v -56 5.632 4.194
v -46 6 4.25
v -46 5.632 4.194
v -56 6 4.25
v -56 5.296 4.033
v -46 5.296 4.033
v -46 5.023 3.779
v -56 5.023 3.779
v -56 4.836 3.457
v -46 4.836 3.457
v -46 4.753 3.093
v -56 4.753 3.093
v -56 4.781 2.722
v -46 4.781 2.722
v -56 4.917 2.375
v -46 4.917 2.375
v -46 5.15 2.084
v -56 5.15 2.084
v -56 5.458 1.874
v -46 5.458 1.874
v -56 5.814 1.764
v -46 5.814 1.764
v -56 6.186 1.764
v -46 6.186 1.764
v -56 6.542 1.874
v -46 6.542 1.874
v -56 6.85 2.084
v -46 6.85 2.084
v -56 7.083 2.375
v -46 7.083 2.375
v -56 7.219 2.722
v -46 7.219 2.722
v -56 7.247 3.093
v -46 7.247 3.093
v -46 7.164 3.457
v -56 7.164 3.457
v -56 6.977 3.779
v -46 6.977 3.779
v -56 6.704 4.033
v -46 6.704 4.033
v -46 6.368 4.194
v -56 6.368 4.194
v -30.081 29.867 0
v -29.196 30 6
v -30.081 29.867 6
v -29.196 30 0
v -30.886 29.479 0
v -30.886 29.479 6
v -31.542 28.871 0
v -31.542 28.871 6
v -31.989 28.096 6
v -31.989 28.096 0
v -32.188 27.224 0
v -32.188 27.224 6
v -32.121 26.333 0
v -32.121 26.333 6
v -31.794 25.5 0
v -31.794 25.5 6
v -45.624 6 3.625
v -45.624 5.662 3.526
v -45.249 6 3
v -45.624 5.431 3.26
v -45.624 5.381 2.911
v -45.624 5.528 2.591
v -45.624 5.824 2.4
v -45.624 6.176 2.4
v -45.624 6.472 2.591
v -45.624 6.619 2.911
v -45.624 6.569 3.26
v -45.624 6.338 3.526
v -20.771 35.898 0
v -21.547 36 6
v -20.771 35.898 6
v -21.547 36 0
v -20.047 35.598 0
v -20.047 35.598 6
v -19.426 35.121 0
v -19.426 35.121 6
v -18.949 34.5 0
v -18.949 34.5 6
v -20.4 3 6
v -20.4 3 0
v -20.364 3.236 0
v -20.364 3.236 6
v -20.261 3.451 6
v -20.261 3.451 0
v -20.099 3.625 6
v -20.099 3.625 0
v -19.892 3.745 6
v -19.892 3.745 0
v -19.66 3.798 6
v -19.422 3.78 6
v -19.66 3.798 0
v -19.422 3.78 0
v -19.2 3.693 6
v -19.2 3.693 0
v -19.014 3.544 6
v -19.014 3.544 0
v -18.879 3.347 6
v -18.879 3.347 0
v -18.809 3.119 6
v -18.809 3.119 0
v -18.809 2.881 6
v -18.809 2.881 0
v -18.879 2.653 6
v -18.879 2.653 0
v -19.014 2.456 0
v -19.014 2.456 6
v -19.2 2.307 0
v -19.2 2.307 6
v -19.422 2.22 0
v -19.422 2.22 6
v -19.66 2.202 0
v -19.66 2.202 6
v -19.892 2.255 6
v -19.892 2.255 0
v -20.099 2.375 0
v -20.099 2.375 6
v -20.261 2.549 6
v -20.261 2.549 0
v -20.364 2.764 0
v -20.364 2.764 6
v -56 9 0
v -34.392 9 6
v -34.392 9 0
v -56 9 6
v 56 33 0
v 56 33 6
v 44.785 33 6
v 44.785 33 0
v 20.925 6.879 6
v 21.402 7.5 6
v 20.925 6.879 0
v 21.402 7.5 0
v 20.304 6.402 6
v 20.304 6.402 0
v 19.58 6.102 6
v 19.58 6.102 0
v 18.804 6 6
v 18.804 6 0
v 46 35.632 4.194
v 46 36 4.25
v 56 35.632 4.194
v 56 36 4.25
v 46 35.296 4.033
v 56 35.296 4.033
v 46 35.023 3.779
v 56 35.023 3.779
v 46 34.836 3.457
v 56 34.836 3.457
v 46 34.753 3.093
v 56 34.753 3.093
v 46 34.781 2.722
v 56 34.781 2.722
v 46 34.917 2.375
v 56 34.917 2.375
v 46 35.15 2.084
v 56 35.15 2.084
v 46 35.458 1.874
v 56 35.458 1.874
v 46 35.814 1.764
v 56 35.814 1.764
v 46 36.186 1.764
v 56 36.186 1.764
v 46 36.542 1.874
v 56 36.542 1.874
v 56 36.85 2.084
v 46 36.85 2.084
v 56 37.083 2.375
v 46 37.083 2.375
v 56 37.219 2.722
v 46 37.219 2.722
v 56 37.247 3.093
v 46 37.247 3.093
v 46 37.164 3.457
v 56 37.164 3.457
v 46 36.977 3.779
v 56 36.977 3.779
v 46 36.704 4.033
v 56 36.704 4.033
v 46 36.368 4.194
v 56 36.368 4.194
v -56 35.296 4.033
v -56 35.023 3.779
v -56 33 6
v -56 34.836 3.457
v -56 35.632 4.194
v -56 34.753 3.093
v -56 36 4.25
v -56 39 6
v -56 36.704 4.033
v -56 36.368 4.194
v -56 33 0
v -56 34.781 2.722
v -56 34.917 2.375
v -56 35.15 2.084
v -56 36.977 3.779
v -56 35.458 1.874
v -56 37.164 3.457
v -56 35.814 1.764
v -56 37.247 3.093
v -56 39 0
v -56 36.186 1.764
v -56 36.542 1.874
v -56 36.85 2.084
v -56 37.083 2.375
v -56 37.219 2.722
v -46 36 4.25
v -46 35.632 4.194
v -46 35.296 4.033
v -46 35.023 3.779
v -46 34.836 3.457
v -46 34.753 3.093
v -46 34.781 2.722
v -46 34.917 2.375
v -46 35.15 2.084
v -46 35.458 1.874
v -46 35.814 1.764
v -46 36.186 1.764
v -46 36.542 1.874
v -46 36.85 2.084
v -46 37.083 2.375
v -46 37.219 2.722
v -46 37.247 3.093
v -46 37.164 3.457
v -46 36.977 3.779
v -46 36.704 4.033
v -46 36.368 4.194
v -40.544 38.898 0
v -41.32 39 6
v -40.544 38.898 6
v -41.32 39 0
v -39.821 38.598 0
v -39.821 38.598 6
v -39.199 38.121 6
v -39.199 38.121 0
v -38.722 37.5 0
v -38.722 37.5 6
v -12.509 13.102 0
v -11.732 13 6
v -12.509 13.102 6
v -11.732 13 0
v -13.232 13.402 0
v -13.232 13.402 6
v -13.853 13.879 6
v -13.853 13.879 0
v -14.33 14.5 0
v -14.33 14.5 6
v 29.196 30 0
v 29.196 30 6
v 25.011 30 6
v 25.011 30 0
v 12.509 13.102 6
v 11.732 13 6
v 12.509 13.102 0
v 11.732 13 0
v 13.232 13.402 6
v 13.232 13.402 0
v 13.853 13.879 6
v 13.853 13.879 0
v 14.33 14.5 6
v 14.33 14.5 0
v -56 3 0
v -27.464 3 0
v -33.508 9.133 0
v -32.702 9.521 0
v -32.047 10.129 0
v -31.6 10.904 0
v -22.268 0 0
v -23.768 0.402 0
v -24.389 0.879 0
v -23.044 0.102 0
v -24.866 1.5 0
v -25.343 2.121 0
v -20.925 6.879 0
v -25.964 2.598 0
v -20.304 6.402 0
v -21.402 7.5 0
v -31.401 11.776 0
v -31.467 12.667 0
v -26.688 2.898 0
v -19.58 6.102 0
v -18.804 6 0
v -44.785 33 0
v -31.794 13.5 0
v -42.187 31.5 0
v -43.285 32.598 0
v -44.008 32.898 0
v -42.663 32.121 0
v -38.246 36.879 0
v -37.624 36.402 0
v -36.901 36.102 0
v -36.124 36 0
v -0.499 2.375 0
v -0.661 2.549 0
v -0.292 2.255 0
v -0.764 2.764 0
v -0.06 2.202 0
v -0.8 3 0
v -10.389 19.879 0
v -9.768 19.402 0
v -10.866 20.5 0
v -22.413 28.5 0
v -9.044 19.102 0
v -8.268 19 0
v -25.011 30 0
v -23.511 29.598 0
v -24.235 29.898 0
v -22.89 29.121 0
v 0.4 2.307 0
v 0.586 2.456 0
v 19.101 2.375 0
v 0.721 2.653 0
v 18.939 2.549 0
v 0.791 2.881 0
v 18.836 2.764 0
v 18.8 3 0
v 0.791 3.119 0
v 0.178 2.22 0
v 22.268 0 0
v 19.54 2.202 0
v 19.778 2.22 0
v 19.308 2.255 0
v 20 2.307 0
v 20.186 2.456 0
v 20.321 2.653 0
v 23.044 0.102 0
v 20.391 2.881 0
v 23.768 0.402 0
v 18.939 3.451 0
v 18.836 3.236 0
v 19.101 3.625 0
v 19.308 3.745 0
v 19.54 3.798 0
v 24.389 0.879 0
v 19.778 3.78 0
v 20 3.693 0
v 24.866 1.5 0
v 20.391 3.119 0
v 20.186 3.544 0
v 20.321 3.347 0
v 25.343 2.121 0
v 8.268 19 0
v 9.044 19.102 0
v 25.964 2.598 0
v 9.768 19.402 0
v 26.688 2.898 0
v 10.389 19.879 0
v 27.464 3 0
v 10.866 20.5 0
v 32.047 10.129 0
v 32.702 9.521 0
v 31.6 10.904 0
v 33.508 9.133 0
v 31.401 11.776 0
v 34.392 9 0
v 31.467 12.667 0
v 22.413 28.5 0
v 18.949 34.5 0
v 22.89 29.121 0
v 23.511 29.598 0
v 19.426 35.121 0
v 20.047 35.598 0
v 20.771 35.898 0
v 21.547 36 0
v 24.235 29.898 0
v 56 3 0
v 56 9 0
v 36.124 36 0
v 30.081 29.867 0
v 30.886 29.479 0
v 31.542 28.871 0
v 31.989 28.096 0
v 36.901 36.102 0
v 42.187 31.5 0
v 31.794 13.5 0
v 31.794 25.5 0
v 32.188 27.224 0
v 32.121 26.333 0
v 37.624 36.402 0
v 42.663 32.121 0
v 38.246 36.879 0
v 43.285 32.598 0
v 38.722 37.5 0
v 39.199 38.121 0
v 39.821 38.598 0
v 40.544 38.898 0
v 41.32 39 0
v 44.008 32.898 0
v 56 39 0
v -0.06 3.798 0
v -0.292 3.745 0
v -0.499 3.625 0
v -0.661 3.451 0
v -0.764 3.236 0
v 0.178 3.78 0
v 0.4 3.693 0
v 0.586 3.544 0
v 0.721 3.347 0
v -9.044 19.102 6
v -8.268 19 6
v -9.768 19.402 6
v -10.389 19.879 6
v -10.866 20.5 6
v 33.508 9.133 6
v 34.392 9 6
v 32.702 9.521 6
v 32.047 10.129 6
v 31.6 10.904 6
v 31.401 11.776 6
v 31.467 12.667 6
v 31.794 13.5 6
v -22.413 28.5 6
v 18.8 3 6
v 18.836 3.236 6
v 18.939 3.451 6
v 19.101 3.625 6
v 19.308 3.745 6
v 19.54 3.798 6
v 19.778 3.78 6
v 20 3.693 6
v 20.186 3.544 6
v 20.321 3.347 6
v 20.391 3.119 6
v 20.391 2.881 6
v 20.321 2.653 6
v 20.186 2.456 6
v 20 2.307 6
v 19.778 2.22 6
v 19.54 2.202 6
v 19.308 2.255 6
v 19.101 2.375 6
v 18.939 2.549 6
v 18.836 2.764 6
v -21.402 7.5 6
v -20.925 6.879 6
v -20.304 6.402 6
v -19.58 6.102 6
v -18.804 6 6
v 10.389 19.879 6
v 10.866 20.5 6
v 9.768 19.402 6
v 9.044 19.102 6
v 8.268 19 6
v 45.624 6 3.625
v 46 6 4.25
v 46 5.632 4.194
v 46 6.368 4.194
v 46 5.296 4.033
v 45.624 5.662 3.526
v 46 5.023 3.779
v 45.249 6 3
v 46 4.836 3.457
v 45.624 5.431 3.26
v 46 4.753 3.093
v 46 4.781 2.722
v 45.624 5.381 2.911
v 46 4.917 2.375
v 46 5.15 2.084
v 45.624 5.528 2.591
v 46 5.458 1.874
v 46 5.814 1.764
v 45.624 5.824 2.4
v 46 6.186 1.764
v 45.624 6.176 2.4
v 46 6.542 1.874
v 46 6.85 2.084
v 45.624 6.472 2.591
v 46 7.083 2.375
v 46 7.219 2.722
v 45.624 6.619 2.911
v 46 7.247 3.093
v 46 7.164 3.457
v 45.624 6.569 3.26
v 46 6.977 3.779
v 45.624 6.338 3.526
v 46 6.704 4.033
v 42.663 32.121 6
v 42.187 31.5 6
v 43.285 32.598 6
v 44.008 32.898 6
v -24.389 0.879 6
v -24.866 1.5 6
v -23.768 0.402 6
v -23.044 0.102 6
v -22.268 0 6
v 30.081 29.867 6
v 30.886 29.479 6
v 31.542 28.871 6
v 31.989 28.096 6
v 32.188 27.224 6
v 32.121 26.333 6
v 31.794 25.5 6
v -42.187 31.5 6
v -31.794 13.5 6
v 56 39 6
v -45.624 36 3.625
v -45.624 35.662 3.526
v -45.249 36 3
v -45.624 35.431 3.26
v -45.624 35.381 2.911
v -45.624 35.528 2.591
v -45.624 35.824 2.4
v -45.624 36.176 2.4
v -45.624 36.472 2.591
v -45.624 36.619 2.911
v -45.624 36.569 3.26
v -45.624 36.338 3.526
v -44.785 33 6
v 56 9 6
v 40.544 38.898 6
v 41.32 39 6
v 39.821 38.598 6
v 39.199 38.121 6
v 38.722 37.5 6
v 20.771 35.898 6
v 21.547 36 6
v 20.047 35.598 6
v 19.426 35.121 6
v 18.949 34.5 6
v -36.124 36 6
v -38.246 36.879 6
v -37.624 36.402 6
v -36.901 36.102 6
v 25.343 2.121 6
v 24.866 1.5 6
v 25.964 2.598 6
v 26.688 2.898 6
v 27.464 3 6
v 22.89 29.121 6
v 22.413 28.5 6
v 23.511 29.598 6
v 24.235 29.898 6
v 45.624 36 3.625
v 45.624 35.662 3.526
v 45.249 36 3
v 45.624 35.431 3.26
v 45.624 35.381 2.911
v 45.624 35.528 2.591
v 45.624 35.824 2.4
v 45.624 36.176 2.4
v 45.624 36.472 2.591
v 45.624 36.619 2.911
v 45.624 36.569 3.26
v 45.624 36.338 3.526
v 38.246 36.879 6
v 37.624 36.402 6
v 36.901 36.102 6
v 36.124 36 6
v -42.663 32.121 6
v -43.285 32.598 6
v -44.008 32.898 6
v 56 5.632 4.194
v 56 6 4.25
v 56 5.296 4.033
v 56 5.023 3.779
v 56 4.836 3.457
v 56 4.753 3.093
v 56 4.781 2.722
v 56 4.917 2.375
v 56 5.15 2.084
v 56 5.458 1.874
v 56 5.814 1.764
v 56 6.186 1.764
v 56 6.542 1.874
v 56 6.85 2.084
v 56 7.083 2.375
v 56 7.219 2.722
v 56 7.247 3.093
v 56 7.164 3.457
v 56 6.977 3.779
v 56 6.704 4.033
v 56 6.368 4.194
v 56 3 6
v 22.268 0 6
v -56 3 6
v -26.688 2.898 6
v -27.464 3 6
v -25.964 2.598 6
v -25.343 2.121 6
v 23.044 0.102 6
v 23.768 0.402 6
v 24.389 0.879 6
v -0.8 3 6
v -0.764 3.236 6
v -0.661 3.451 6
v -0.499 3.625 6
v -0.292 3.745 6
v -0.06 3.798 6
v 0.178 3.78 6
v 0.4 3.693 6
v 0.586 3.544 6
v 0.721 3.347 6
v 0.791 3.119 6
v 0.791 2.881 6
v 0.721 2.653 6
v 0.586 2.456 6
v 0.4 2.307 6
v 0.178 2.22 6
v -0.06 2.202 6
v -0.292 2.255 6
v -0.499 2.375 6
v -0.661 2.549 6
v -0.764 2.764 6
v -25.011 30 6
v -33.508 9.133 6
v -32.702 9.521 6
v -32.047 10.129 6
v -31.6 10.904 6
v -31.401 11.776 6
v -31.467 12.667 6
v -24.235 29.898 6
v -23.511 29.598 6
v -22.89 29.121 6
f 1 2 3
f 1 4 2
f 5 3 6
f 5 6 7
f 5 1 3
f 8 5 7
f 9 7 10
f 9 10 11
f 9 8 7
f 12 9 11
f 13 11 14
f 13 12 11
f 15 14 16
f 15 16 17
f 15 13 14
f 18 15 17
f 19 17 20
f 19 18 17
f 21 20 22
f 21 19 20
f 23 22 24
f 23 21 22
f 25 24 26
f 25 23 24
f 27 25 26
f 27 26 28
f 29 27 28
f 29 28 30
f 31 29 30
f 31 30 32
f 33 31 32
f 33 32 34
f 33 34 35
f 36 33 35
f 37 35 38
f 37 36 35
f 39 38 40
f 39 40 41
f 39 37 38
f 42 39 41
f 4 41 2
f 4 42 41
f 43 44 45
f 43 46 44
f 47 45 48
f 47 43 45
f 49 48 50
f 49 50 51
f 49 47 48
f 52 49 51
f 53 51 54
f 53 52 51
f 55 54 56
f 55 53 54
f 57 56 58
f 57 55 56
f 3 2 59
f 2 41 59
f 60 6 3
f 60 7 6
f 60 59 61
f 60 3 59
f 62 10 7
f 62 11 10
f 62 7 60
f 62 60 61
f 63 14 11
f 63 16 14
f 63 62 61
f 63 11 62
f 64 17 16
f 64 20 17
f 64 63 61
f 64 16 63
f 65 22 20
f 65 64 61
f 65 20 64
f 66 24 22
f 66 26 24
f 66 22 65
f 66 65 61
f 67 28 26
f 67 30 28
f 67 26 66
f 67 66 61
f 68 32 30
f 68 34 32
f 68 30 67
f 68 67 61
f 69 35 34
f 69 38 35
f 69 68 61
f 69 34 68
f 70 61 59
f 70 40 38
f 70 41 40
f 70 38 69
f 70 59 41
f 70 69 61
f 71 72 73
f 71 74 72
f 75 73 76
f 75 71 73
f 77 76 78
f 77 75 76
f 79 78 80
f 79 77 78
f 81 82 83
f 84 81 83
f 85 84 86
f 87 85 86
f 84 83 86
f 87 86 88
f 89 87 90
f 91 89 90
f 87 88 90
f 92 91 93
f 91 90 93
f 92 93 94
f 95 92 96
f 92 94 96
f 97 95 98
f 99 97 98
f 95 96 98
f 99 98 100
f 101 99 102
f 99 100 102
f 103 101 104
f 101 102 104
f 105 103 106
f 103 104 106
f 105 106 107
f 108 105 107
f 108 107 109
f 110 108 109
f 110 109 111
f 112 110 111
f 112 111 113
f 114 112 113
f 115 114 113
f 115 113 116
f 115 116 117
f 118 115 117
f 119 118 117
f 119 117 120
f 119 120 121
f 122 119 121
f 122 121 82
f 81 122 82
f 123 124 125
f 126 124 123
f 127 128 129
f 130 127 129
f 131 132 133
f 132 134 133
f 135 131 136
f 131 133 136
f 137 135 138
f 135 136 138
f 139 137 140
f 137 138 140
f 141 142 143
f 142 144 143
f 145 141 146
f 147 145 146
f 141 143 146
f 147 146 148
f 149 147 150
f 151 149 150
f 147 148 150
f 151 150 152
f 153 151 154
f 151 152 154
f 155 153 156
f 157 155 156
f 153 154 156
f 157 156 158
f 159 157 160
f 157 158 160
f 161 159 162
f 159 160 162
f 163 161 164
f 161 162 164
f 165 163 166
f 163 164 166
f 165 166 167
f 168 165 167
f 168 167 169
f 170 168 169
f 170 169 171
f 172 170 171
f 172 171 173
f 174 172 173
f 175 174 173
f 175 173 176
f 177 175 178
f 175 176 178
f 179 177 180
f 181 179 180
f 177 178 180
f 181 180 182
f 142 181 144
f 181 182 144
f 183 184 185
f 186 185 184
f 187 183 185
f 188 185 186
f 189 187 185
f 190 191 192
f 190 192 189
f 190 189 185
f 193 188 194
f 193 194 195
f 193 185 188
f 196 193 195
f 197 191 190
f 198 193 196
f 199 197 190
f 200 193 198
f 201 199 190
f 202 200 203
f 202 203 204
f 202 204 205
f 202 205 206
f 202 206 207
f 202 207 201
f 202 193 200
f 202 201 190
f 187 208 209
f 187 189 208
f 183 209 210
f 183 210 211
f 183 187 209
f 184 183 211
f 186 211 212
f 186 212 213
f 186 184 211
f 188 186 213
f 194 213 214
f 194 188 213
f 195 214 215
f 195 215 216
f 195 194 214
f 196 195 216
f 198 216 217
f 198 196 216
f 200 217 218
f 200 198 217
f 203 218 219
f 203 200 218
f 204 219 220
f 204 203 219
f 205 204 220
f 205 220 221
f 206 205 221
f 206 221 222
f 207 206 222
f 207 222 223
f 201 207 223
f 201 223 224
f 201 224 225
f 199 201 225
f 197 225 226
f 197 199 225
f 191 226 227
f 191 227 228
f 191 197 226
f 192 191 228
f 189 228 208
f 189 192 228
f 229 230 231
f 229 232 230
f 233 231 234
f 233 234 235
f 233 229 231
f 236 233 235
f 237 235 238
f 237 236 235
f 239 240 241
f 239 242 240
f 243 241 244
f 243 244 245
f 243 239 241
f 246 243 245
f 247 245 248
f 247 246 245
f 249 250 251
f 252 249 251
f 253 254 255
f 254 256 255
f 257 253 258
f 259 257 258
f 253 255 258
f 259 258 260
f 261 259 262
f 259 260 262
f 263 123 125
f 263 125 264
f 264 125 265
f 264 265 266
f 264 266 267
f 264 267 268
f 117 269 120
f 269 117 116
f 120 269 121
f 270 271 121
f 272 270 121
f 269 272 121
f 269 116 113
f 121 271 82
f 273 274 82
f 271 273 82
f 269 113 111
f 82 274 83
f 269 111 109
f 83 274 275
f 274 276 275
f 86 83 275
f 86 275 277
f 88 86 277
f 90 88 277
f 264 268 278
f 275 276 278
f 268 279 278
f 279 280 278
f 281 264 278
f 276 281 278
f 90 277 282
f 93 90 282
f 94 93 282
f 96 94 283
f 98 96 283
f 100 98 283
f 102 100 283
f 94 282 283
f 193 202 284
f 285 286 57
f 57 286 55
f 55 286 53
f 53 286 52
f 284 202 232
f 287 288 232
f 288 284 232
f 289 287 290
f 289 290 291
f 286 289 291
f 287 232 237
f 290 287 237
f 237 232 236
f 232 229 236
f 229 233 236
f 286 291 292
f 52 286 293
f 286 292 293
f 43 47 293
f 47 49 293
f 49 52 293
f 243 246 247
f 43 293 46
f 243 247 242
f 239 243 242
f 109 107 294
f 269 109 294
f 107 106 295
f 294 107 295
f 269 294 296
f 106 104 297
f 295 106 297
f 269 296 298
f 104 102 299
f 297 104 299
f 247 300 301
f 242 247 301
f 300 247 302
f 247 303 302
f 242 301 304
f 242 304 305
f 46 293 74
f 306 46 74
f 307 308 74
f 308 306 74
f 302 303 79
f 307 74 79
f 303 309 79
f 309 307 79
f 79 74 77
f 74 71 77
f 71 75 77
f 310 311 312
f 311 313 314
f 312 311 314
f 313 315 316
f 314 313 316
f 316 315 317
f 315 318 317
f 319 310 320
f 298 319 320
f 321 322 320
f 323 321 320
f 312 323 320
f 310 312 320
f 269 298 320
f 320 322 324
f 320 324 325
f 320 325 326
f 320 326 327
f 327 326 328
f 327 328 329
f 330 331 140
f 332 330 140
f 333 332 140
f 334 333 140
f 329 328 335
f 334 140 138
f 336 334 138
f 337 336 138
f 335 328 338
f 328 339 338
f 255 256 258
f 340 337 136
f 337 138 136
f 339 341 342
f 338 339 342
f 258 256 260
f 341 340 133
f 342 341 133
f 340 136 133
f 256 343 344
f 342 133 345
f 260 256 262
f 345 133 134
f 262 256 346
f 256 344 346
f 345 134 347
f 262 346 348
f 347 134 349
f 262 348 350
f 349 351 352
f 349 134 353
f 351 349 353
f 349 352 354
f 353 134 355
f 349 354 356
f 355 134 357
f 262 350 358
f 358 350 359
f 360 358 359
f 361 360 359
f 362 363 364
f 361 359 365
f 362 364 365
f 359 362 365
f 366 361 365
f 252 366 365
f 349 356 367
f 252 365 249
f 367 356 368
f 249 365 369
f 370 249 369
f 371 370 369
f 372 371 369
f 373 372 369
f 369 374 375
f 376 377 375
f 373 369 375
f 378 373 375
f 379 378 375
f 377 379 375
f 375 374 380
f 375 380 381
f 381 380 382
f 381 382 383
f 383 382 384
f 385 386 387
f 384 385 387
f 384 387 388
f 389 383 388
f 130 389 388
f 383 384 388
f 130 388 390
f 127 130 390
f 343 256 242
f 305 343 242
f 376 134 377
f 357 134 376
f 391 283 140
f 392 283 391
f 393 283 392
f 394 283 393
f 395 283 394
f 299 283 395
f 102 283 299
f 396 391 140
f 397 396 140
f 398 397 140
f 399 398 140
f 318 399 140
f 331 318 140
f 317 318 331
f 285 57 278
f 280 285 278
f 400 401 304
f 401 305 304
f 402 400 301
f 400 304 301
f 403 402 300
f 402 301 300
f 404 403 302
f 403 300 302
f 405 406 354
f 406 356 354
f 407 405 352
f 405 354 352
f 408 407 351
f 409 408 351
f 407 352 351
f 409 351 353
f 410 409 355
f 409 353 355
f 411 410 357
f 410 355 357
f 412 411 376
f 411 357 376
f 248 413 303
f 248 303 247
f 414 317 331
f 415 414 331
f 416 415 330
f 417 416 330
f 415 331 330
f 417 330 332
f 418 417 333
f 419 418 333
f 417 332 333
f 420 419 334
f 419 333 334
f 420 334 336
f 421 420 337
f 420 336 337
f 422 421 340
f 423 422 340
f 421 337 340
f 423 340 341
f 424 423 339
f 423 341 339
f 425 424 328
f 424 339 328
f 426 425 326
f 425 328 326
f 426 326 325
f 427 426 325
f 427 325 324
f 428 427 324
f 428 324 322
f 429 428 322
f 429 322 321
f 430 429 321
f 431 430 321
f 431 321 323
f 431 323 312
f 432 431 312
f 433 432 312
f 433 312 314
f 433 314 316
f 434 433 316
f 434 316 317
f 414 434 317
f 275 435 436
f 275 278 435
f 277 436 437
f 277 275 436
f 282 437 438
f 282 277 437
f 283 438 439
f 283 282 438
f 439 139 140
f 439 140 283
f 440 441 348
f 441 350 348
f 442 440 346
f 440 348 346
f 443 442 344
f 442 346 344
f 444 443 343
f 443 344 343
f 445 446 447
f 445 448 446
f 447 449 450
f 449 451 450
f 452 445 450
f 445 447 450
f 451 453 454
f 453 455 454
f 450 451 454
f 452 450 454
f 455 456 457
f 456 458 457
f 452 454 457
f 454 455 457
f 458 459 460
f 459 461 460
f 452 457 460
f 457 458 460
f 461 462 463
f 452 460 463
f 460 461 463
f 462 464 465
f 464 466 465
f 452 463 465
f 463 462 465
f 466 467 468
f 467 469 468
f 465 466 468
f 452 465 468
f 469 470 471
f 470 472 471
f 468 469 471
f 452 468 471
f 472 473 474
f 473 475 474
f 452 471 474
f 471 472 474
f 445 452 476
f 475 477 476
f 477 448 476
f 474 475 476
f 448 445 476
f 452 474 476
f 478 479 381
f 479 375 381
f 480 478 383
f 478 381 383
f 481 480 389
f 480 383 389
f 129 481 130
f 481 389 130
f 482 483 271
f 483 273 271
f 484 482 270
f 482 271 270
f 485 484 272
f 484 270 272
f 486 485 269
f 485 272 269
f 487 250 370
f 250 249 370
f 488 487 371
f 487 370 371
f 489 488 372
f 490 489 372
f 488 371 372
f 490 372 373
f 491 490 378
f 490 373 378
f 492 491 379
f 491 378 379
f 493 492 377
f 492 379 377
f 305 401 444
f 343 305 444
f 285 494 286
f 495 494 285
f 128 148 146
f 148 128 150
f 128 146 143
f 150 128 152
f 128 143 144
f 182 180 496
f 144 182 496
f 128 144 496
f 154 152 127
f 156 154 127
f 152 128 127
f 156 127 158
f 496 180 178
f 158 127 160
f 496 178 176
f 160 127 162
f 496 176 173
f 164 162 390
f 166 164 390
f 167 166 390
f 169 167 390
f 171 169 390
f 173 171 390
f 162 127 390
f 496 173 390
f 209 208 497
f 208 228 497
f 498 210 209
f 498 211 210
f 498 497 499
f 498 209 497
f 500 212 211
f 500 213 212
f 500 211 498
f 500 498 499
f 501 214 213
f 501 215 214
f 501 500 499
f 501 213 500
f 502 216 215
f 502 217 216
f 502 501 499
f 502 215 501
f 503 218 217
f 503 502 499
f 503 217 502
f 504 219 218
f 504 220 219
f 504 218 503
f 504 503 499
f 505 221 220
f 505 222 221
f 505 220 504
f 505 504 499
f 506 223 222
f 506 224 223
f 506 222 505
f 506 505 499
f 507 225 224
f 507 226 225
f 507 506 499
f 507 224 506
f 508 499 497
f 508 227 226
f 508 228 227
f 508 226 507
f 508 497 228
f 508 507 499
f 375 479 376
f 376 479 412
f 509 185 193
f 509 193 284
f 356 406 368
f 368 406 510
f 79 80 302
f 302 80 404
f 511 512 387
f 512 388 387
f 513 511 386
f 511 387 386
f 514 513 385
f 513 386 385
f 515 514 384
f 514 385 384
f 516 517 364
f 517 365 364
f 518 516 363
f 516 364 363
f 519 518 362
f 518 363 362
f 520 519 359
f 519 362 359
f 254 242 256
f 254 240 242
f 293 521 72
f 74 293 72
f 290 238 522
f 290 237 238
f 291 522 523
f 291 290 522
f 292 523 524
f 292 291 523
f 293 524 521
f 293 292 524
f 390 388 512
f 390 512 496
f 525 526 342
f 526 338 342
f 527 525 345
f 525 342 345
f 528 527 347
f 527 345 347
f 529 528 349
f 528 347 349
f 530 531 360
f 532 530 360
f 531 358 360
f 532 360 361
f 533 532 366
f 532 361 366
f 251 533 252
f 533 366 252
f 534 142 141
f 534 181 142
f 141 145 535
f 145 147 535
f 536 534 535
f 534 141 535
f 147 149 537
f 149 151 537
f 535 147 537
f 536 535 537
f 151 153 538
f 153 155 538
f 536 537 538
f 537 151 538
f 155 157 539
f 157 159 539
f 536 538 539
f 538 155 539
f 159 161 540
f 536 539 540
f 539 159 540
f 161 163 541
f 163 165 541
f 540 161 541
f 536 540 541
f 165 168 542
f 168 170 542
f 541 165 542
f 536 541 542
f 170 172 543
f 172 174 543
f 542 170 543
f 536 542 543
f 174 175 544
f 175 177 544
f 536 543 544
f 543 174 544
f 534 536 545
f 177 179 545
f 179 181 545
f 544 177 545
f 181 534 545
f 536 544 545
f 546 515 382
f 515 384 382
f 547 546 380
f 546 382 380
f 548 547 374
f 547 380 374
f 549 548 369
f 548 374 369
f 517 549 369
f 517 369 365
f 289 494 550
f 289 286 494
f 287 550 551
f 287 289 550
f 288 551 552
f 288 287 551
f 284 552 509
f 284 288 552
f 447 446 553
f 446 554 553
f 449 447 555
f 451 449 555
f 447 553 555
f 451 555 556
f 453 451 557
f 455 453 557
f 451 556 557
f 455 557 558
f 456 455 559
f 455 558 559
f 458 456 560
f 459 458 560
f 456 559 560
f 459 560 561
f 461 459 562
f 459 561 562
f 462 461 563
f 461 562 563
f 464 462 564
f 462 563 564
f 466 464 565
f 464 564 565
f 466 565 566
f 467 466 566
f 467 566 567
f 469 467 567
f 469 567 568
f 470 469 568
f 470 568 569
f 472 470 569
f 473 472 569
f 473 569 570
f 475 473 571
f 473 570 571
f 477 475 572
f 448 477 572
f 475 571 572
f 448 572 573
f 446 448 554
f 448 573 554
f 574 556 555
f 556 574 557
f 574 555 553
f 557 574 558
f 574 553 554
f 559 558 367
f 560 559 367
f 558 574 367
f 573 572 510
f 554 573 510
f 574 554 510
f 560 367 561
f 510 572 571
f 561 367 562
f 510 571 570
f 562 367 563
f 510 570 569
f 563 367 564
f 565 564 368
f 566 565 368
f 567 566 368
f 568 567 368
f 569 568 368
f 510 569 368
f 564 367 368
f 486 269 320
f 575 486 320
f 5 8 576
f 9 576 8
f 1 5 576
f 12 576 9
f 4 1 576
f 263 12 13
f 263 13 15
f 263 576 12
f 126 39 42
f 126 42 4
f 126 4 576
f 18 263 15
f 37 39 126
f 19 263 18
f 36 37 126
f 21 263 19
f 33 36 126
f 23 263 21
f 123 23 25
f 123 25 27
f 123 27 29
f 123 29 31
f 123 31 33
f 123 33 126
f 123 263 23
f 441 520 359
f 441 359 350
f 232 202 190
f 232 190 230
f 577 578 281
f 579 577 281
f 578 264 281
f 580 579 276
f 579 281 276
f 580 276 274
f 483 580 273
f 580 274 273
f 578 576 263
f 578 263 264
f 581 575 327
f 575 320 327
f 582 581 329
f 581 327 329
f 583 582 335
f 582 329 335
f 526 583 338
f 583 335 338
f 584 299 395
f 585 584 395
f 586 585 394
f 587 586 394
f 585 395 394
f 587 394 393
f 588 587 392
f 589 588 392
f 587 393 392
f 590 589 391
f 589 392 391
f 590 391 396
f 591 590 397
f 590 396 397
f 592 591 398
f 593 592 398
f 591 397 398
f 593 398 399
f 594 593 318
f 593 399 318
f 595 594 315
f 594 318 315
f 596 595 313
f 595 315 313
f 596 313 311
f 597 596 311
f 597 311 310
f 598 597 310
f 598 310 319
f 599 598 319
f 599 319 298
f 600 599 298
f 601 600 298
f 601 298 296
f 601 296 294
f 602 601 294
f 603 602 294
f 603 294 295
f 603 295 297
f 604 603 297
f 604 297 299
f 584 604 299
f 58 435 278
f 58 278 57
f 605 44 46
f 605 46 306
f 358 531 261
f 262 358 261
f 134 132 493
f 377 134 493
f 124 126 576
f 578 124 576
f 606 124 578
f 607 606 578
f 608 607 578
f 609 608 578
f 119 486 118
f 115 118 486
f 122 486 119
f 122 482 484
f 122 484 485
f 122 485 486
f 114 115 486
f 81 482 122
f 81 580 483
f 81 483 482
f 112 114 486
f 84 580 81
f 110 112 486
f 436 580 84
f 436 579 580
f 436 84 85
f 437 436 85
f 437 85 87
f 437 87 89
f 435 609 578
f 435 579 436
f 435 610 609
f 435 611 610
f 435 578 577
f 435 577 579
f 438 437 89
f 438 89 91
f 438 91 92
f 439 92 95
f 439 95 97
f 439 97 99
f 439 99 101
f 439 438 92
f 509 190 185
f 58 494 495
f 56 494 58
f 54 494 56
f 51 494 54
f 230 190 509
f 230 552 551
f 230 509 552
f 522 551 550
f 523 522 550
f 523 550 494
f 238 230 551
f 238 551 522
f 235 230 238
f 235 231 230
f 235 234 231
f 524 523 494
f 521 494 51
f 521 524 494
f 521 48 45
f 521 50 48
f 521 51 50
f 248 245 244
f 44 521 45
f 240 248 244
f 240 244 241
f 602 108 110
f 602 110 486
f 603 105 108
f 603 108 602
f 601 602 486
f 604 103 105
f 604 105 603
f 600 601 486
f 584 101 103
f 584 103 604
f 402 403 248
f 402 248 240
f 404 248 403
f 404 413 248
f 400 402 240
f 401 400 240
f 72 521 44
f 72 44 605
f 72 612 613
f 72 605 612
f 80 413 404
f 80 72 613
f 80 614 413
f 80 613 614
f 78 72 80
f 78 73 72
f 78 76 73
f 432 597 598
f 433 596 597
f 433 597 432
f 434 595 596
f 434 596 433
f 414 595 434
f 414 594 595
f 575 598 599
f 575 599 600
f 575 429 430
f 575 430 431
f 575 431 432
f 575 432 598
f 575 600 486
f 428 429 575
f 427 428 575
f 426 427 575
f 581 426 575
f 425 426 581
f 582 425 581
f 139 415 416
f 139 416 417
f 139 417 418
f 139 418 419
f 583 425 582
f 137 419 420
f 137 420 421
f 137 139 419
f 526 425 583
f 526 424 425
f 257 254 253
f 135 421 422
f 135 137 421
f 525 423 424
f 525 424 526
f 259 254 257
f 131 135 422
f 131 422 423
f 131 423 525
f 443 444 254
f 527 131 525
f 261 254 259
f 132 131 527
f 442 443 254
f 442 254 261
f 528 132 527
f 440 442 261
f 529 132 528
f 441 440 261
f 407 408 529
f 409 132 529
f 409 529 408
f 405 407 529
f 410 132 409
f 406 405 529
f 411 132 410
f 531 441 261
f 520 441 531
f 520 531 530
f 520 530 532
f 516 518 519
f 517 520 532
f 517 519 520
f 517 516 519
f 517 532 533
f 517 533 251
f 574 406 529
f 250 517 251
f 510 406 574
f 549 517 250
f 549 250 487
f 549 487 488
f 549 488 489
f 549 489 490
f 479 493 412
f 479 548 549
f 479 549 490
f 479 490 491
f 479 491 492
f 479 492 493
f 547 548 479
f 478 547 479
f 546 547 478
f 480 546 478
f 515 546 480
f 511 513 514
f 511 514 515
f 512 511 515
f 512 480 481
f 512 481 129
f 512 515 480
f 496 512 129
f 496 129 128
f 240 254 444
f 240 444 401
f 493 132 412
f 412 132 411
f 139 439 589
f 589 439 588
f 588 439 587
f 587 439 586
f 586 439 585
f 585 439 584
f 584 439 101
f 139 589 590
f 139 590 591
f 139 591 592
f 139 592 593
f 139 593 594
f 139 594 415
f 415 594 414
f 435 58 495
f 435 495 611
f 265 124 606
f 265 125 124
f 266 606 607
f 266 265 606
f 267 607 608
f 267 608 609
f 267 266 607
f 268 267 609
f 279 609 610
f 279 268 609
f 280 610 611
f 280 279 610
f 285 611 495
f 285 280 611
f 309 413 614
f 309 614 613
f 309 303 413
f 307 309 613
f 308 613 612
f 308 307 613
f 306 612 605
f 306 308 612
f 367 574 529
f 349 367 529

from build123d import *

# Parameters (mm, degrees)
SKETCH1_W                        = 112
SKETCH1_H                        = 39
BOSS_EXTRUDE1_DEPTH              = 6
CUT_EXTRUDE1_REACH               = 70.505
TAP_DRILL_FOR_M3_TAP1_AT_2_COUNT = 2
TAP_DRILL_FOR_M3_TAP1_AT_2_PITCH = 30
FILLET1_R                        = 3
FILLET1_OF_MIRROR1_R             = 3
TAP_DRILL_FOR_M2_TAP1_D          = 1.6


with BuildPart() as part:
    # Sketch1 → Boss-Extrude1 (new body)
    with BuildSketch(Plane.XY):
        with Locations((0, 19.5)):
            Rectangle(SKETCH1_W, SKETCH1_H)
    extrude(amount=BOSS_EXTRUDE1_DEPTH)

    # Sketch2 → Cut-Extrude1 (cut, up to next)
    with BuildSketch(Plane.XY.offset(6), mode=Mode.PRIVATE) as cut_extrude1_sk1:
        Polygon((-56, 33), (-43.052558883, 33), (-29.196152423, 9), (-56, 9), align=None)
    cut_extrude1_tool1 = extrude(cut_extrude1_sk1.sketch, amount=-CUT_EXTRUDE1_REACH, mode=Mode.PRIVATE) & part.part
    # Sketch2 → Cut-Extrude1 (cut, up to next)
    with BuildSketch(Plane.XY.offset(6), mode=Mode.PRIVATE) as cut_extrude1_sk2:
        Polygon((-39.588457268, 39), (-37.856406461, 36), (-19.814954576, 36), (-10, 19), (0, 19), (0, 39), align=None)
    cut_extrude1_tool2 = extrude(cut_extrude1_sk2.sketch, amount=-CUT_EXTRUDE1_REACH, mode=Mode.PRIVATE) & part.part
    # Sketch2 → Cut-Extrude1 (cut, up to next)
    with BuildSketch(Plane.XY.offset(6), mode=Mode.PRIVATE) as cut_extrude1_sk3:
        Polygon((-56, 3), (-25.732050808, 3), (-24, 0), (-56, 0), align=None)
    cut_extrude1_tool3 = extrude(cut_extrude1_sk3.sketch, amount=-CUT_EXTRUDE1_REACH, mode=Mode.PRIVATE) & part.part
    # Sketch2 → Cut-Extrude1 (cut, up to next)
    with BuildSketch(Plane.XY.offset(6), mode=Mode.PRIVATE) as cut_extrude1_sk4:
        Polygon((-13.464101615, 13), (0, 13), (0, 6), (-20.535898385, 6), (-34.392304845, 30), (-23.279056191, 30), align=None)
    cut_extrude1_tool4 = extrude(cut_extrude1_sk4.sketch, amount=-CUT_EXTRUDE1_REACH, mode=Mode.PRIVATE) & part.part
    cut_extrude1_1 = cut_extrude1_tool1.solids().sort_by_distance((-45.659675, 19.60569, 6))[0]
    add(cut_extrude1_1, mode=Mode.SUBTRACT)
    cut_extrude1_2 = cut_extrude1_tool2.solids().sort_by_distance((-11.382019, 31.286174, 6))[0]
    add(cut_extrude1_2, mode=Mode.SUBTRACT)
    cut_extrude1_3 = cut_extrude1_tool3.solids().sort_by_distance((-40.428998, 1.486092, 6))[0]
    add(cut_extrude1_3, mode=Mode.SUBTRACT)
    cut_extrude1_4 = cut_extrude1_tool4.solids().sort_by_distance((-18.182863, 16.08438, 6))[0]
    add(cut_extrude1_4, mode=Mode.SUBTRACT)
    cut_extrude1 = cut_extrude1_1 + cut_extrude1_2 + cut_extrude1_3 + cut_extrude1_4  # Cut-Extrude1 as one shape, for the pattern or mirror that repeats it

    # Sketch3 → Tap Drill for M3 Tap1 (revolve, cut)
    with BuildSketch(Plane(origin=(-56, 36, 3), x_dir=(0, 0, 1), z_dir=(0, 1, 0))):
        Polygon((0, 0), (0, 10.751075774), (1.25, 10), (1.25, 0), align=None)
    tap_drill_for_m3_tap1 = revolve(axis=Axis((-62.35, 36, 3), (1, 0, 0)), mode=Mode.SUBTRACT)

    # Tap Drill for M3 Tap1 at 2: Tap Drill for M3 Tap1 ×2
    with Locations(*[(0, -i * TAP_DRILL_FOR_M3_TAP1_AT_2_PITCH, 0) for i in range(1, TAP_DRILL_FOR_M3_TAP1_AT_2_COUNT)]):
        add(tap_drill_for_m3_tap1, mode=Mode.SUBTRACT)

    # Fillet1
    fillet1_edges = [part.edges().sort_by_distance(p)[0] for p in [
        (-43.052558883, 33, 3),
        (-29.196152423, 9, 3),
        (-39.588457268, 39, 3),
        (-10, 19, 3),
        (-19.814954576, 36, 3),
        (-37.856406461, 36, 3),
        (-23.279056191, 30, 3),
        (-13.464101615, 13, 3),
        (-20.535898385, 6, 3),
        (-34.392304845, 30, 3),
        (-25.732050808, 3, 3),
        (-24, 0, 3),
    ]]
    fillet(fillet1_edges, radius=FILLET1_R - 0.0001)  # a hair under: the kernel refuses the full size

    # Mirror1: Cut-Extrude1, Tap Drill for M3 Tap1 across plane
    add(cut_extrude1.mirror(Plane(origin=(0, 0, 0), x_dir=(0, 0, 1), z_dir=(1, 0, 0))), mode=Mode.SUBTRACT)
    add(tap_drill_for_m3_tap1.mirror(Plane(origin=(0, 0, 0), x_dir=(0, 0, 1), z_dir=(1, 0, 0))), mode=Mode.SUBTRACT)

    # Mirror1 copy 1 sketch → Mirror1 copy 1 (revolve, cut)
    with BuildSketch(Plane(origin=(56, 6, 3), x_dir=(0, 0, 1), z_dir=(0, 1, 0))):
        Polygon((0, 0), (0, -10.751075774), (1.25, -10), (1.25, 0), align=None)
    revolve(axis=Axis((62.35, 6, 3), (1, 0, 0)), mode=Mode.SUBTRACT)

    # Fillet1 of Mirror1
    fillet1_of_mirror1_edges = [part.edges().sort_by_distance(p)[0] for p in [
        (43.052558883, 33, 3),
        (29.196152423, 9, 3),
        (39.588457268, 39, 3),
        (10, 19, 3),
        (19.814954576, 36, 3),
        (37.856406461, 36, 3),
        (23.279056191, 30, 3),
        (13.464101615, 13, 3),
        (20.535898385, 6, 3),
        (34.392304845, 30, 3),
        (25.732050808, 3, 3),
        (24, 0, 3),
    ]]
    fillet(fillet1_of_mirror1_edges, radius=FILLET1_OF_MIRROR1_R - 0.0001)  # a hair under: the kernel refuses the full size

    # Tap Drill for M2 Tap1 (through all)
    with Locations(Plane.XY.offset(6)):
        with Locations((-19.6, 3), (0, 3), (19.6, 3)):
            Hole(TAP_DRILL_FOR_M2_TAP1_D / 2)


solid = part.part
